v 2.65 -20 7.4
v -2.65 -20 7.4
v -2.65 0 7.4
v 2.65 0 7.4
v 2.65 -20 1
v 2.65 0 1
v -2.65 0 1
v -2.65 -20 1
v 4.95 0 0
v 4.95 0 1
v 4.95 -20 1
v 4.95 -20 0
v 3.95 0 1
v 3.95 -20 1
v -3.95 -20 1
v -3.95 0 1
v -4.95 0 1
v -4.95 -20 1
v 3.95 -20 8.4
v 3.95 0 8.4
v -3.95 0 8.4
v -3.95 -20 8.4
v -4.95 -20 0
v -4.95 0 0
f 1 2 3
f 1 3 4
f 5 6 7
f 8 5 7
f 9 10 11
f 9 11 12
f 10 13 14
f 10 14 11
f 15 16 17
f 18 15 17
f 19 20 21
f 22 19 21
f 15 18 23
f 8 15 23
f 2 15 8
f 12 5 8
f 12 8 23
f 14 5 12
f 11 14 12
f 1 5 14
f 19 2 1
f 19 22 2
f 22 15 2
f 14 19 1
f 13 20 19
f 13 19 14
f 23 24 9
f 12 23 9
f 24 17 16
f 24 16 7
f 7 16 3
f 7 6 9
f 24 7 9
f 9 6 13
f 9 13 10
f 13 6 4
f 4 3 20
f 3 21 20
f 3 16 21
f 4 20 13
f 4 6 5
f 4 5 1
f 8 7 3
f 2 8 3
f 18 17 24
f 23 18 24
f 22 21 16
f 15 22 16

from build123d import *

# Parameters (mm, degrees)
PAD_DEPTH = 20


with BuildPart() as part:
    # Sketch → Pad (new body)
    with BuildSketch(Plane.XZ):
        Polygon((3.95, 8.4), (3.95, 1), (4.95, 1), (4.95, 0), (0, 0), (0, 1), (2.65, 1), (2.65, 7.4), (0, 7.4), (0, 8.4), align=None)
    pad = extrude(amount=PAD_DEPTH)

    # Mirrored: Pad across Sketch V_Axis
    add(pad.mirror(Plane(origin=(0, 0, 0), x_dir=(0, -1, 0), z_dir=(1, 0, 0))))


solid = part.part
